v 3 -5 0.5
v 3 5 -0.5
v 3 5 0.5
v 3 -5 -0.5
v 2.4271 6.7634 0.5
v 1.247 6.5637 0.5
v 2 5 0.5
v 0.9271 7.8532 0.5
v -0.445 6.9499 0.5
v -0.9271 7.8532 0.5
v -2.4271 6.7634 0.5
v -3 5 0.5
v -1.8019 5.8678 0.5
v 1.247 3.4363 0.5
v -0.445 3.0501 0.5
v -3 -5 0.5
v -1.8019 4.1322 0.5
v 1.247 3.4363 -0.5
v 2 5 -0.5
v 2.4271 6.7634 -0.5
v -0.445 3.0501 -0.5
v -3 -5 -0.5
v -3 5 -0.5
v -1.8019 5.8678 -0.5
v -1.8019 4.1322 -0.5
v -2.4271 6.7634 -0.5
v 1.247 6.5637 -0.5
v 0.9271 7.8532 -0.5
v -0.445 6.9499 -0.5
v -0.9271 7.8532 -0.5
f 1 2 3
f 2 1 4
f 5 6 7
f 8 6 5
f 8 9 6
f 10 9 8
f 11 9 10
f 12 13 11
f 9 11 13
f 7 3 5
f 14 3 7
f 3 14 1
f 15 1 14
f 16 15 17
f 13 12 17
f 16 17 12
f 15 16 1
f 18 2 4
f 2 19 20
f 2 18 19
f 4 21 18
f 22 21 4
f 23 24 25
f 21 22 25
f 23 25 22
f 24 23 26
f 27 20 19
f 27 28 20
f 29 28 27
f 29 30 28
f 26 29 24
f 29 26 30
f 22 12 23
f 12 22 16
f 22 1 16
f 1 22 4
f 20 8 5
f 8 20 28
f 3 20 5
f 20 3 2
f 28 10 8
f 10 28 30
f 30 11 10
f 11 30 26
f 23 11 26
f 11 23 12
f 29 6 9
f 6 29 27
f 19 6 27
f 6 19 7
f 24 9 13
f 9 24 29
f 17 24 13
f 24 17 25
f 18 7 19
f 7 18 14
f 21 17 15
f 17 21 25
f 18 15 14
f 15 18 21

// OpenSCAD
module hinge(thickness=1, outer_radius = 3, body_length=10, wall_thickness=1) {
 
  
    inner_radius = outer_radius - wall_thickness;
    difference(){
        union(){
            
            cube([2 * outer_radius, body_length, thickness], center=true);
            translate([0, body_length / 2, 0])
            cylinder(r=outer_radius, h=thickness, center=true);
        }
        translate([0, body_length / 2, 0])
        cylinder(r=inner_radius, h=thickness + 1, center=true);
    }
}

hinge();
